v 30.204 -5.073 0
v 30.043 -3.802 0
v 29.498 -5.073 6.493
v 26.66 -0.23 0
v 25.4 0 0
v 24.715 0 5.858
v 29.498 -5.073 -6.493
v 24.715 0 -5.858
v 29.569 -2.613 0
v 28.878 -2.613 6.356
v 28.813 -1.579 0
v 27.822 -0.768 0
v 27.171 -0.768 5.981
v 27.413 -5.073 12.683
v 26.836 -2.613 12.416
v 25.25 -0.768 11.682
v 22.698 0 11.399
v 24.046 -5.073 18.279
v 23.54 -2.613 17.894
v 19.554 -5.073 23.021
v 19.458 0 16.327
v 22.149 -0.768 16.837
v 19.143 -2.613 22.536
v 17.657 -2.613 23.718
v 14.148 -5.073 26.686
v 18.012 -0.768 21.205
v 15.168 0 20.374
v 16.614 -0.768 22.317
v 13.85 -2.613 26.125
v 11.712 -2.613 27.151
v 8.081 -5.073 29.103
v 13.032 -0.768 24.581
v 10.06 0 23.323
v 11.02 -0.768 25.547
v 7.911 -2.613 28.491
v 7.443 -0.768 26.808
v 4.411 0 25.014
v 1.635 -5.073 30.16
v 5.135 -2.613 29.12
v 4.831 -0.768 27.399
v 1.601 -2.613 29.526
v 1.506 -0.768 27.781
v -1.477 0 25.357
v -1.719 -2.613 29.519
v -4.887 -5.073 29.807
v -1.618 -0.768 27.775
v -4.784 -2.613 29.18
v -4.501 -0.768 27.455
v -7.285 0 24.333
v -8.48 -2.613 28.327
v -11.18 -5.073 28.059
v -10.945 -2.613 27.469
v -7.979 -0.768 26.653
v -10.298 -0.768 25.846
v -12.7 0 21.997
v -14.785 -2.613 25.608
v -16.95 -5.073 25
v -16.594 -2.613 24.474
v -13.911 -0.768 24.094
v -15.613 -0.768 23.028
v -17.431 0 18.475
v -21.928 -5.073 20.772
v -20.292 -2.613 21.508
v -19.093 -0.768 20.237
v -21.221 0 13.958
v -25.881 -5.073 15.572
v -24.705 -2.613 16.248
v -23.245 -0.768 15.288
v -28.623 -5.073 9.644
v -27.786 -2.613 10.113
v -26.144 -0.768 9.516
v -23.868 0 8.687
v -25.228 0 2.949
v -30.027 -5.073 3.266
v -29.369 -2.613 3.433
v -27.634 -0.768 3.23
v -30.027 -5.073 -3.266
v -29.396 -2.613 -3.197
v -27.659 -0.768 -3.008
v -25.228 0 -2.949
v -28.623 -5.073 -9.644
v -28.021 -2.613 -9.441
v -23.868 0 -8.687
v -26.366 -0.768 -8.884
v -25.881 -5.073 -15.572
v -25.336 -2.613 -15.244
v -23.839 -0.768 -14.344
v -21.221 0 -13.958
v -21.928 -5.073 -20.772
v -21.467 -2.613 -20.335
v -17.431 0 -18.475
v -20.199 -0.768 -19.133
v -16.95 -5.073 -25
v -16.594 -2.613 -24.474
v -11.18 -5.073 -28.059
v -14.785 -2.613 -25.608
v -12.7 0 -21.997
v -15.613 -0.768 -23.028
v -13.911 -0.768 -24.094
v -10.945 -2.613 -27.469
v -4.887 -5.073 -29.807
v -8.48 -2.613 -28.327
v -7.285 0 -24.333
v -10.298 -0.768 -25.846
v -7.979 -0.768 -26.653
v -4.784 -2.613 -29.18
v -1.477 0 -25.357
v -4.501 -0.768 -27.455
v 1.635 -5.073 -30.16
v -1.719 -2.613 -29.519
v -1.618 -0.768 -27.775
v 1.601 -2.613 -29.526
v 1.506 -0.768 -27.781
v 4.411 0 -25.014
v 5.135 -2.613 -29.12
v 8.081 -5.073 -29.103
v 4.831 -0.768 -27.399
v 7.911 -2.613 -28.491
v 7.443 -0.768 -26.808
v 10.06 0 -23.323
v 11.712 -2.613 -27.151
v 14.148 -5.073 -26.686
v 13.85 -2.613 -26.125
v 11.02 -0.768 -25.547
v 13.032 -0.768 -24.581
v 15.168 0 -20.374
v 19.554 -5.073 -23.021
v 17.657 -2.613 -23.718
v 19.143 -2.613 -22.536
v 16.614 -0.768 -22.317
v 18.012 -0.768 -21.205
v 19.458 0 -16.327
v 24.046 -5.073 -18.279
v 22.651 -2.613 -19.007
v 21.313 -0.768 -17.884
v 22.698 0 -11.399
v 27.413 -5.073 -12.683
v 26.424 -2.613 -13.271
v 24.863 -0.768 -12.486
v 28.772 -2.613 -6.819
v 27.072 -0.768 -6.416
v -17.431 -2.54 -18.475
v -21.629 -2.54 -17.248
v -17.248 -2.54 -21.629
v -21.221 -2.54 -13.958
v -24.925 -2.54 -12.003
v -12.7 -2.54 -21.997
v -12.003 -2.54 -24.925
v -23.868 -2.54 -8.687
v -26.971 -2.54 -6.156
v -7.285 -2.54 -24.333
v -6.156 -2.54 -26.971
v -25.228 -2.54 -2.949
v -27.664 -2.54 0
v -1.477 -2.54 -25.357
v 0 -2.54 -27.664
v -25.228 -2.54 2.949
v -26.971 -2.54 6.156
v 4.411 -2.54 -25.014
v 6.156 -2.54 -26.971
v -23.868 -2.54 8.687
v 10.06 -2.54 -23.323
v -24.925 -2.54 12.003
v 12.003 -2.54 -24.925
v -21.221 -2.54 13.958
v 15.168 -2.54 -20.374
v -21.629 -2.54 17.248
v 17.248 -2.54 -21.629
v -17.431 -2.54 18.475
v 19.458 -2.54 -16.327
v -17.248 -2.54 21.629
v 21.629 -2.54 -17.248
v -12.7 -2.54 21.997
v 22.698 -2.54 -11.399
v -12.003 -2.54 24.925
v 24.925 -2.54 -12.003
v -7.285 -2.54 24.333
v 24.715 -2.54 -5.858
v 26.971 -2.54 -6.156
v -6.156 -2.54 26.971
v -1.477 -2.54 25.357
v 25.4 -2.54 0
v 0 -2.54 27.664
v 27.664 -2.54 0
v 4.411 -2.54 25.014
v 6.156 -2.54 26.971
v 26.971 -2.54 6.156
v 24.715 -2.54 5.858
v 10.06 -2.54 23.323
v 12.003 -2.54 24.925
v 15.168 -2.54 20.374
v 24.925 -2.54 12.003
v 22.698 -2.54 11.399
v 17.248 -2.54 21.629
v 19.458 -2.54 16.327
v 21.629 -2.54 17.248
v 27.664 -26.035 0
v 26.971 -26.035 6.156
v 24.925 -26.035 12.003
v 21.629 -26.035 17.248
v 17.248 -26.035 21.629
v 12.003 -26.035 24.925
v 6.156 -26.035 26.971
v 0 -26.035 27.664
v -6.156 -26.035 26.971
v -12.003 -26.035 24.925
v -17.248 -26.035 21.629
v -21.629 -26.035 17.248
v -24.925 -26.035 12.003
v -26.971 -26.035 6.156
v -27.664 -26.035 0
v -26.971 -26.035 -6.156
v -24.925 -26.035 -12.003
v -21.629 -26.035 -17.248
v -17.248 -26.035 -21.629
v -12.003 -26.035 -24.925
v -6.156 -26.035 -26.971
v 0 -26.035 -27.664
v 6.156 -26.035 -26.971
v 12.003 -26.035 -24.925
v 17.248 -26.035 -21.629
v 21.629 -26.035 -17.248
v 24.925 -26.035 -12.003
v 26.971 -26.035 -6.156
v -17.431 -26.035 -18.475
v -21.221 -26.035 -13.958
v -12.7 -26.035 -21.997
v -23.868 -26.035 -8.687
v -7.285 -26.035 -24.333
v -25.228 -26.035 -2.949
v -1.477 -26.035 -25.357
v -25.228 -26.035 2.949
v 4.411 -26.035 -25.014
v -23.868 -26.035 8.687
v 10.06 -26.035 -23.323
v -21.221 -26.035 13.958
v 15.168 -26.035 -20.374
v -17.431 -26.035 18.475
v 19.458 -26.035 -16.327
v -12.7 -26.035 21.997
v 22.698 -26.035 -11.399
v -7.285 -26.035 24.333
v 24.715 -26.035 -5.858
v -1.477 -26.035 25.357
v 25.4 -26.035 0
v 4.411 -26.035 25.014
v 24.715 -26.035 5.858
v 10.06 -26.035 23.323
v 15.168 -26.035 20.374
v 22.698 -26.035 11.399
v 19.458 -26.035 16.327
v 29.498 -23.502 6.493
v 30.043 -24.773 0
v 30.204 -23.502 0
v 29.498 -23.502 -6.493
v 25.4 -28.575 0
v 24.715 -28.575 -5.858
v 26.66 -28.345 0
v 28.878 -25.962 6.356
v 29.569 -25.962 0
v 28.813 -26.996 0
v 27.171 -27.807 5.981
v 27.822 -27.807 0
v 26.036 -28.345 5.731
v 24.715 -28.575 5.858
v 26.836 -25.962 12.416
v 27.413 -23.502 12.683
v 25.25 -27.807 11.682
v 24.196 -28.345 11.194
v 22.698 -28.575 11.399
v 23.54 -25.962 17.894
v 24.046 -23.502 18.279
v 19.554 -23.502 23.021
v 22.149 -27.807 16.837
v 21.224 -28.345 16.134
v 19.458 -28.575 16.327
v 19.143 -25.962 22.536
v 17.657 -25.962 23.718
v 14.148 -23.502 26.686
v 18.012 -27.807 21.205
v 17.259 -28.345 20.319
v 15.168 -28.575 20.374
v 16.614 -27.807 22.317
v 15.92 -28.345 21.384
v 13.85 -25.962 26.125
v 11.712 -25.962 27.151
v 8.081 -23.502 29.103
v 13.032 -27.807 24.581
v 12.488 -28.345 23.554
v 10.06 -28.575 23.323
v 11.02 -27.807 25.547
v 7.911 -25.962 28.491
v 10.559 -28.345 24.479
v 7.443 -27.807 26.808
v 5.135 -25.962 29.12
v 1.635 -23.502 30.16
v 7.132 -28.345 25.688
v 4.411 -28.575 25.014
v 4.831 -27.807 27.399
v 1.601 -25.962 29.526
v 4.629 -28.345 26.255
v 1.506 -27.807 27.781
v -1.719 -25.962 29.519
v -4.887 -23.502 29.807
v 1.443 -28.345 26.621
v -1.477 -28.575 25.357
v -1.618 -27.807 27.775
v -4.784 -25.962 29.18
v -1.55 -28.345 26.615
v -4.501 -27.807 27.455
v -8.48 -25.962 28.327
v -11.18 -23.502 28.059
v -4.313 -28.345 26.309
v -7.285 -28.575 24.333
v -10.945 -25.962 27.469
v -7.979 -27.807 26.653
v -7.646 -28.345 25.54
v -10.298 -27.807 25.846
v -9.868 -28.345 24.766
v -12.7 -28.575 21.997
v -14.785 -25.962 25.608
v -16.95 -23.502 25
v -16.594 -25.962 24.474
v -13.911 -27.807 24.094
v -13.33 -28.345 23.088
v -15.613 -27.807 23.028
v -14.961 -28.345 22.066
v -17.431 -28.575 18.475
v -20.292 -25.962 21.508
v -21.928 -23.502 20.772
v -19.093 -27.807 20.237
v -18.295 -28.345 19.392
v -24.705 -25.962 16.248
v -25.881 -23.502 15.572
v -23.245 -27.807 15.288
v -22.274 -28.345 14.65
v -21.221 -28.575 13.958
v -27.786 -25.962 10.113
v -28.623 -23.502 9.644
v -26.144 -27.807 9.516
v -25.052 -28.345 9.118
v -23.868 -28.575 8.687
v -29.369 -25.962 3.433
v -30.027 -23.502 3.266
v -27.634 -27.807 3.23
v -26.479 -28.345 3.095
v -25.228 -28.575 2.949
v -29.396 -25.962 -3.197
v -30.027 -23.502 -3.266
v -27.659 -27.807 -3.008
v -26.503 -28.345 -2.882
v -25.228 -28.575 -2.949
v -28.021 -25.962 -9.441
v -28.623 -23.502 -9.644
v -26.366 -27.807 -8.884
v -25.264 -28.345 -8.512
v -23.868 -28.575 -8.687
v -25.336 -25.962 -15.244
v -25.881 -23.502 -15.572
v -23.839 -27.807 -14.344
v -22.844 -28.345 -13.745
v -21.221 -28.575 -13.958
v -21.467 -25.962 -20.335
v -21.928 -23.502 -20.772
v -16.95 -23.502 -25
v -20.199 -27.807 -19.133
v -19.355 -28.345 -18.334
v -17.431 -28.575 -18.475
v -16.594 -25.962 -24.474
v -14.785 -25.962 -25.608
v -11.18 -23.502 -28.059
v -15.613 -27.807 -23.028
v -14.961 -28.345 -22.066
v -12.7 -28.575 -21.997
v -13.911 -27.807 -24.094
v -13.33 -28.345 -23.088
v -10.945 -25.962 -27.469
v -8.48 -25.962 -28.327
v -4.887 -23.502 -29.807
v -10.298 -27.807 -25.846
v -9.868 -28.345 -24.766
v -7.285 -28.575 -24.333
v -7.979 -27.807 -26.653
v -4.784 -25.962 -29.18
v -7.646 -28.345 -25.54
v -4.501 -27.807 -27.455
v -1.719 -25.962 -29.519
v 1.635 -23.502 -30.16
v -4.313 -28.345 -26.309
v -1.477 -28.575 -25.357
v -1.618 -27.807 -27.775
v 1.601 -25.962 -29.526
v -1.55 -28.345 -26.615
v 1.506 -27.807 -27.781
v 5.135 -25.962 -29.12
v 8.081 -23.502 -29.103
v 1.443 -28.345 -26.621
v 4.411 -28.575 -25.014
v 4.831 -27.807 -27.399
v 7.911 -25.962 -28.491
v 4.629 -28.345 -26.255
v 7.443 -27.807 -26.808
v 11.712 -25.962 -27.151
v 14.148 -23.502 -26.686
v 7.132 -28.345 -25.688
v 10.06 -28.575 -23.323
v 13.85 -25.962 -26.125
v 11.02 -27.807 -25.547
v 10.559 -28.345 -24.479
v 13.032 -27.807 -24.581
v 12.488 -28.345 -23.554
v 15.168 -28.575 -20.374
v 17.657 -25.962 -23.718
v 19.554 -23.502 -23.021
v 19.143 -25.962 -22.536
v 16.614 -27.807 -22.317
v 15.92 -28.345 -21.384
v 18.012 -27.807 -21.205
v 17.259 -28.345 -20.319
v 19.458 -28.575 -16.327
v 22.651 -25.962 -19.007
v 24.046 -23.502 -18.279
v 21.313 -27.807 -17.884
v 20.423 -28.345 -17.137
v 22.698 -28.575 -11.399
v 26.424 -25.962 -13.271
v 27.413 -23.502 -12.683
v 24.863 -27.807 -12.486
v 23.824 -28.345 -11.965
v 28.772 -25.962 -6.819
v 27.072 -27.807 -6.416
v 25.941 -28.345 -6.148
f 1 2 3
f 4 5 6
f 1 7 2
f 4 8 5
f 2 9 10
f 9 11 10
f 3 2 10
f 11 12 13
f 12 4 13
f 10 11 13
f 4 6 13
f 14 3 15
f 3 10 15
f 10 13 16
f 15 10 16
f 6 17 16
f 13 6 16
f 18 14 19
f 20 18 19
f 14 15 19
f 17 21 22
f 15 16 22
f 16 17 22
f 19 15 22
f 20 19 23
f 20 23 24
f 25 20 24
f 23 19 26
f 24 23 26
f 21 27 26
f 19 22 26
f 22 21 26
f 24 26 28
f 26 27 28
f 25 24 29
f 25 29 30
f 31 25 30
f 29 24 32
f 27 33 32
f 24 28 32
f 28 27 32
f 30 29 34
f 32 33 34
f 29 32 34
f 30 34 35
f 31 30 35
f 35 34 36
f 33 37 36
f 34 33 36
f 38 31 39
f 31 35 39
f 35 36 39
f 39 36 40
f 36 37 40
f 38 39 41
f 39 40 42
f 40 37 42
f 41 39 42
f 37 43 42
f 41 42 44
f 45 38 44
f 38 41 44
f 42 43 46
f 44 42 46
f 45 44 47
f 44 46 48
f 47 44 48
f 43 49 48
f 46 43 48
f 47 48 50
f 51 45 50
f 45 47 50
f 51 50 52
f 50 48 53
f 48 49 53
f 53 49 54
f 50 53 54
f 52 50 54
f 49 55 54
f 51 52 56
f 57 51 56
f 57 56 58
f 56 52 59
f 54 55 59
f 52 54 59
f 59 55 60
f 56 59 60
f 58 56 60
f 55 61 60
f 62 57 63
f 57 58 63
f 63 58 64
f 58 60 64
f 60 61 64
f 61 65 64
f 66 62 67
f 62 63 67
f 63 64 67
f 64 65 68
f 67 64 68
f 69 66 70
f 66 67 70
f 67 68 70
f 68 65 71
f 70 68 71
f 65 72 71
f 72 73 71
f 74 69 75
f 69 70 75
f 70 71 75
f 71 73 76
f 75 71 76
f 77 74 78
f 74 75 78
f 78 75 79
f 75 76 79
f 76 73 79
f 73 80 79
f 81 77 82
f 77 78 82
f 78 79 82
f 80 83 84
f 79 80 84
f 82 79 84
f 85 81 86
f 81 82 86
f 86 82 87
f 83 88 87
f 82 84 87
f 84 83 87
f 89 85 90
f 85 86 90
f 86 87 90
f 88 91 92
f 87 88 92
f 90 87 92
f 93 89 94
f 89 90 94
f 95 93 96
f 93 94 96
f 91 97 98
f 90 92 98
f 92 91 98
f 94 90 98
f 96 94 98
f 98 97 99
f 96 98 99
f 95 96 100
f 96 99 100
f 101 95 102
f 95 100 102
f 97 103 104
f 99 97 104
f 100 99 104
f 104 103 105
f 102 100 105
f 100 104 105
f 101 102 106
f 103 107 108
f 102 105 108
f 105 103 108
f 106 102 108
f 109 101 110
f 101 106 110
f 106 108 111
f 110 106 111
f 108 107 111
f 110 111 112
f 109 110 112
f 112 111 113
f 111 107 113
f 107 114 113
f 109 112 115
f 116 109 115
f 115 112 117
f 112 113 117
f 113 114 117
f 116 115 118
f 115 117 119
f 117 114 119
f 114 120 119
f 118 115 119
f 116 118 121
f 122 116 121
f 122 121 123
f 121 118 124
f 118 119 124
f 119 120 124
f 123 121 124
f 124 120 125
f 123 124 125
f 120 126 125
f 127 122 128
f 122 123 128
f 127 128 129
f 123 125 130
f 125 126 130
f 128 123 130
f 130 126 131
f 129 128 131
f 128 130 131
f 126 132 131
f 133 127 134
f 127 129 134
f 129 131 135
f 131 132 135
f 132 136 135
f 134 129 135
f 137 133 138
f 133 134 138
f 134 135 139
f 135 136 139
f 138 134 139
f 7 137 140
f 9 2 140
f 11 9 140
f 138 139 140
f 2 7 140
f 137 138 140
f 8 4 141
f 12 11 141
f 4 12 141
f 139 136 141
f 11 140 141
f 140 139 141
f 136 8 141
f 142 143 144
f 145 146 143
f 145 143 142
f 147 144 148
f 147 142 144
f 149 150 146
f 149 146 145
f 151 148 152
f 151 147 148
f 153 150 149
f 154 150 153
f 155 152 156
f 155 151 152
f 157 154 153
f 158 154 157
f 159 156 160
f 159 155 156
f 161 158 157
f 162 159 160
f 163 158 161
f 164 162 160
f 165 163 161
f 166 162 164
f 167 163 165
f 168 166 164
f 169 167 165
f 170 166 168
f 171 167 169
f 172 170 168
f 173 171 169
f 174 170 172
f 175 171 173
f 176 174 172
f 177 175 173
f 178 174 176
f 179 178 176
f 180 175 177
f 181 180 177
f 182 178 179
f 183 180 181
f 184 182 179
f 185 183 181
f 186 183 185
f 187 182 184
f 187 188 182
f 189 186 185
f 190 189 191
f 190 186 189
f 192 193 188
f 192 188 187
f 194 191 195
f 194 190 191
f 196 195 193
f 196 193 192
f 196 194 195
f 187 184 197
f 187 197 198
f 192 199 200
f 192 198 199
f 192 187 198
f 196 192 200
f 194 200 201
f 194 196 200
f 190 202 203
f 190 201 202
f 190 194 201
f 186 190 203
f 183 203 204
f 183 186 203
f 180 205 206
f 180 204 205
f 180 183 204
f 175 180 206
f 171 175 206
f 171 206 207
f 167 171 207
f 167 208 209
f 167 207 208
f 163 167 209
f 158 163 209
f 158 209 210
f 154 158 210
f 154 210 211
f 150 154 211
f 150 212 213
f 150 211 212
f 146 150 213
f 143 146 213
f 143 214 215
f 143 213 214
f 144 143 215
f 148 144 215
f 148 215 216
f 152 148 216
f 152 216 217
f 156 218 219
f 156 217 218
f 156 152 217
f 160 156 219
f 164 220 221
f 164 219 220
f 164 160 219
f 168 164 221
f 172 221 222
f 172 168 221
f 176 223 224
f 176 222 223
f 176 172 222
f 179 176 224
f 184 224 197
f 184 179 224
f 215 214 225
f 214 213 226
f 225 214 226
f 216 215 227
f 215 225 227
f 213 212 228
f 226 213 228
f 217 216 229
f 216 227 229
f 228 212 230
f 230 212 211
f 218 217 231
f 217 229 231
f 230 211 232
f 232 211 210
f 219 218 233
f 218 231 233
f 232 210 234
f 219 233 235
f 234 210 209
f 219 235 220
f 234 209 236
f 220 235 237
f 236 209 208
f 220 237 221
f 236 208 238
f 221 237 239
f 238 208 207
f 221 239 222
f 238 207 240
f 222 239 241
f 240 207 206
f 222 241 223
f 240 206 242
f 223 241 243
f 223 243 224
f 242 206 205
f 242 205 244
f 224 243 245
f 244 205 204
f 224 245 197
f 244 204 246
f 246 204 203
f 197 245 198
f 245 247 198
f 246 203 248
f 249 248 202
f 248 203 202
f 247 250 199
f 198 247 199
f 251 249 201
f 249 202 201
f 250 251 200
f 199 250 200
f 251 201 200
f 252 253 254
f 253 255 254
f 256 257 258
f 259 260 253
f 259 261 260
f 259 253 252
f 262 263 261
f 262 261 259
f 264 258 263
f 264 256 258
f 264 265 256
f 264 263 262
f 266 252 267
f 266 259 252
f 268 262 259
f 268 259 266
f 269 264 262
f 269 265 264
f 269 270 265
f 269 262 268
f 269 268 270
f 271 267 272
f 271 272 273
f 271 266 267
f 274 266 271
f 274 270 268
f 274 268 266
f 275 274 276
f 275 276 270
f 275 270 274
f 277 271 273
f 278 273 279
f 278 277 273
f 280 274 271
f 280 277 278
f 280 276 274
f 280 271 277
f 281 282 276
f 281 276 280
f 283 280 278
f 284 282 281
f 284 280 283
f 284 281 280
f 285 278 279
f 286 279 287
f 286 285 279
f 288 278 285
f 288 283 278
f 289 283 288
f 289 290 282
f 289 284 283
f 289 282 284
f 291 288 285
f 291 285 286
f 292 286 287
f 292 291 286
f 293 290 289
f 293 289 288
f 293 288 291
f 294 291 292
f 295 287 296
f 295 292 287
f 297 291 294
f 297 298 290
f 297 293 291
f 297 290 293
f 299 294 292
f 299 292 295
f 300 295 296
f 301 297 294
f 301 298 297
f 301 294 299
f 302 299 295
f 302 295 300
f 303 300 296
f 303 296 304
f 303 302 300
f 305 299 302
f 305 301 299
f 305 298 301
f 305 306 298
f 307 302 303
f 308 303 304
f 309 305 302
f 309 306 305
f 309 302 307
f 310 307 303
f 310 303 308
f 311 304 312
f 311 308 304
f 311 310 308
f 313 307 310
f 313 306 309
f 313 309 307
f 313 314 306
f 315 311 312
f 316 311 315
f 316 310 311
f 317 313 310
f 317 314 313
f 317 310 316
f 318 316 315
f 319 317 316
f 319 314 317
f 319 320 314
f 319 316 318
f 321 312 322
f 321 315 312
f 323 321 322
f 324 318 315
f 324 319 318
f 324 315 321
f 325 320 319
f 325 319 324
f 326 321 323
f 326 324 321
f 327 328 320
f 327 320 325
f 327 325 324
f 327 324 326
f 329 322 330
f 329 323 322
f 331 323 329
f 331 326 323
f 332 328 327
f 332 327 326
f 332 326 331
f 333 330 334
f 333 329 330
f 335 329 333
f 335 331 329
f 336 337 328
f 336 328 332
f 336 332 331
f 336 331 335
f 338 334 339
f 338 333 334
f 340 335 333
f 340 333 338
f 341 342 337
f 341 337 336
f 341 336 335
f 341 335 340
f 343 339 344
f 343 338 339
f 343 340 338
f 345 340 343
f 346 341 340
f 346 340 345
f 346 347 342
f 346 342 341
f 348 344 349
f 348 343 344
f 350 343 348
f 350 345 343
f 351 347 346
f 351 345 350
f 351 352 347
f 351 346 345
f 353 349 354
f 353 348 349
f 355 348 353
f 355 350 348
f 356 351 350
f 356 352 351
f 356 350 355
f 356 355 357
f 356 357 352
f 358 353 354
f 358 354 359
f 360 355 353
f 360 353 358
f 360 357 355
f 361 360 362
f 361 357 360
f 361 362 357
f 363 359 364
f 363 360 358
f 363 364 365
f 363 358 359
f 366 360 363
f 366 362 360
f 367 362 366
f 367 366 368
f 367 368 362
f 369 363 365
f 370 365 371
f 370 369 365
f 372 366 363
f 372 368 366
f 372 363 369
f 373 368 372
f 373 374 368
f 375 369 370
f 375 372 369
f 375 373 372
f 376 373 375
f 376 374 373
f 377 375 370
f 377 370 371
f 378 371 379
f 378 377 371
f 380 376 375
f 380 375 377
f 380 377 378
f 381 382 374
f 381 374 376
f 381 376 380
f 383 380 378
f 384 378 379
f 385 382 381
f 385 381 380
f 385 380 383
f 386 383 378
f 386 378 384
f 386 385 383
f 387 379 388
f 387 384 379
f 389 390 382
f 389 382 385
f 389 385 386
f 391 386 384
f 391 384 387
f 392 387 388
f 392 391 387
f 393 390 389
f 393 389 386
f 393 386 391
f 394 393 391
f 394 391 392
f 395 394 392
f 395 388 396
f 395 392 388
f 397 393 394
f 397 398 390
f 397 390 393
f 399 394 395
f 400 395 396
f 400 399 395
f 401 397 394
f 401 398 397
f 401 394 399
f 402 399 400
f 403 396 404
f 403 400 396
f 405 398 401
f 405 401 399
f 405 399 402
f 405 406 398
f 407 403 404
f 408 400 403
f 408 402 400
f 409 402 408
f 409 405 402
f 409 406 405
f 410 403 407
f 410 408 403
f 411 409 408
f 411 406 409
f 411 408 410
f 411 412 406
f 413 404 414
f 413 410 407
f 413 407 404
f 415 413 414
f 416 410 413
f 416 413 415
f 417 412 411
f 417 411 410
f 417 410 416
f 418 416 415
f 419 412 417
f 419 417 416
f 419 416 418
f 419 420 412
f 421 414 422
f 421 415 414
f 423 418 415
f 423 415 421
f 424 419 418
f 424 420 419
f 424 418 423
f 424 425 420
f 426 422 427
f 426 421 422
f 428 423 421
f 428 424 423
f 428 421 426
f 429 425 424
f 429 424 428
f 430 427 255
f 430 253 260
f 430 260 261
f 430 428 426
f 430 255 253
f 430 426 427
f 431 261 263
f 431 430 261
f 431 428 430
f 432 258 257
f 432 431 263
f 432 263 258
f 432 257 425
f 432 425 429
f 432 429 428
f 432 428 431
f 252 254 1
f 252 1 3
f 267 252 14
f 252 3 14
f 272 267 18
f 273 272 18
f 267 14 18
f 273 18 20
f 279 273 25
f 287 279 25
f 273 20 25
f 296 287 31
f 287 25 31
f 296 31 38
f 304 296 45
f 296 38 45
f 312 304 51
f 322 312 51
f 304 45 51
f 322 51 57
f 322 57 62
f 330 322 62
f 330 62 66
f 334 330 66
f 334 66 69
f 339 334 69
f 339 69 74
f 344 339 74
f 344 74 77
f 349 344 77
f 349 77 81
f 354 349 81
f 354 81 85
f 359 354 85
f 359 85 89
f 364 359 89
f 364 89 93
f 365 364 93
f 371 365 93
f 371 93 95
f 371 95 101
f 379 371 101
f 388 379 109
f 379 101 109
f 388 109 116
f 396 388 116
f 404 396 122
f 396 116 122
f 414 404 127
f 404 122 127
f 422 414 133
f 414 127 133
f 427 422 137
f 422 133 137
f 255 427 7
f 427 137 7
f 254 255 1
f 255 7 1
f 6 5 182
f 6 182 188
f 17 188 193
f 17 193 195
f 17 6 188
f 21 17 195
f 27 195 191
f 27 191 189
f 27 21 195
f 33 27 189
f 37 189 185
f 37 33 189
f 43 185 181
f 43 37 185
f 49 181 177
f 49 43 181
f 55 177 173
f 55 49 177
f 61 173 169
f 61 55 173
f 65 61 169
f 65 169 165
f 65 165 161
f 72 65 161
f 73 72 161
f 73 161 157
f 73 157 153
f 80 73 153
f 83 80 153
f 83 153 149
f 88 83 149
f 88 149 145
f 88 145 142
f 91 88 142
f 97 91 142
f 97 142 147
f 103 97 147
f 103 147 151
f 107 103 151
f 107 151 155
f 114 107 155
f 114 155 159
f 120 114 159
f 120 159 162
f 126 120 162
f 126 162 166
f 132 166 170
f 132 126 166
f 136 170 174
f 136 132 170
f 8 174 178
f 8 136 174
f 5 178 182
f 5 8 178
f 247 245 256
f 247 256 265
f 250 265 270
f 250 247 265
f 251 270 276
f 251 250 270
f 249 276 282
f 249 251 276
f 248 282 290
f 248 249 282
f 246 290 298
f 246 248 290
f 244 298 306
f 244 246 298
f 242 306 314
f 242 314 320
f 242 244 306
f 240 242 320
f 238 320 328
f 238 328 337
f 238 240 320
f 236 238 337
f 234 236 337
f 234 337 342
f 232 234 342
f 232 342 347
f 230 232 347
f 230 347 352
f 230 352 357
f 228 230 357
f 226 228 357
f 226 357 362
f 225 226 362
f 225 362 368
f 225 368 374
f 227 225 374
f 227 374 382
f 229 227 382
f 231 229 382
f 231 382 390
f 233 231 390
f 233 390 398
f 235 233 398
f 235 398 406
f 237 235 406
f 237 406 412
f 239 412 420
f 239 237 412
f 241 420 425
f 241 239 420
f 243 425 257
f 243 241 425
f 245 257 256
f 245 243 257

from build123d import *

# Parameters (mm, degrees)
F0_R     = 30.20441
F0_R_2   = 25.4
F2_DEPTH = 28.575
F3_T     = -2.54


# Not quite as in the source:
# - a fillet or chamfer that OpenCascade refuses, or shapes differently, is made with other operations: its cross-section is extruded or revolved along the edge and cut away or added


with BuildPart() as f2:
    # F0 (on Front) → F2 (new body)
    with BuildSketch(Plane.XZ):
        Circle(F0_R)
        Circle(F0_R_2, mode=Mode.SUBTRACT)
    extrude(amount=F2_DEPTH)

    # F3
    f3_openings = [f2.faces().sort_by_distance(p)[0] for p in [
        (-25.4, -14.2875, 0),
    ]]
    offset(amount=F3_T, openings=f3_openings)

    # F4: fillet of radius 5.08 on 2 edges, made by hand

    # F4_s1 → F4_t2 (revolve, cut)
    with BuildSketch(Plane.XY):
        with BuildLine():
            ThreePointArc((30.20441, -5.072519113), (28.8126614285, -1.5792110247), (25.4, 0))
            Line((25.4, 0), (30.20441, 0))
            Line((30.20441, 0), (30.20441, -5.072519113))
        make_face()
    revolve(axis=Axis((0, 0, 0), (0, -1, 0)), mode=Mode.SUBTRACT)

    # F4_s3 → F4_t4 (revolve, cut)
    with BuildSketch(Plane.XY):
        with BuildLine():
            ThreePointArc((30.20441, -23.502480887), (28.8126614285, -26.9957889753), (25.4, -28.575))
            Line((25.4, -28.575), (30.20441, -28.575))
            Line((30.20441, -28.575), (30.20441, -23.502480887))
        make_face()
    revolve(axis=Axis((0, -28.575, 0), (0, -1, 0)), mode=Mode.SUBTRACT)


solid = f2.part
